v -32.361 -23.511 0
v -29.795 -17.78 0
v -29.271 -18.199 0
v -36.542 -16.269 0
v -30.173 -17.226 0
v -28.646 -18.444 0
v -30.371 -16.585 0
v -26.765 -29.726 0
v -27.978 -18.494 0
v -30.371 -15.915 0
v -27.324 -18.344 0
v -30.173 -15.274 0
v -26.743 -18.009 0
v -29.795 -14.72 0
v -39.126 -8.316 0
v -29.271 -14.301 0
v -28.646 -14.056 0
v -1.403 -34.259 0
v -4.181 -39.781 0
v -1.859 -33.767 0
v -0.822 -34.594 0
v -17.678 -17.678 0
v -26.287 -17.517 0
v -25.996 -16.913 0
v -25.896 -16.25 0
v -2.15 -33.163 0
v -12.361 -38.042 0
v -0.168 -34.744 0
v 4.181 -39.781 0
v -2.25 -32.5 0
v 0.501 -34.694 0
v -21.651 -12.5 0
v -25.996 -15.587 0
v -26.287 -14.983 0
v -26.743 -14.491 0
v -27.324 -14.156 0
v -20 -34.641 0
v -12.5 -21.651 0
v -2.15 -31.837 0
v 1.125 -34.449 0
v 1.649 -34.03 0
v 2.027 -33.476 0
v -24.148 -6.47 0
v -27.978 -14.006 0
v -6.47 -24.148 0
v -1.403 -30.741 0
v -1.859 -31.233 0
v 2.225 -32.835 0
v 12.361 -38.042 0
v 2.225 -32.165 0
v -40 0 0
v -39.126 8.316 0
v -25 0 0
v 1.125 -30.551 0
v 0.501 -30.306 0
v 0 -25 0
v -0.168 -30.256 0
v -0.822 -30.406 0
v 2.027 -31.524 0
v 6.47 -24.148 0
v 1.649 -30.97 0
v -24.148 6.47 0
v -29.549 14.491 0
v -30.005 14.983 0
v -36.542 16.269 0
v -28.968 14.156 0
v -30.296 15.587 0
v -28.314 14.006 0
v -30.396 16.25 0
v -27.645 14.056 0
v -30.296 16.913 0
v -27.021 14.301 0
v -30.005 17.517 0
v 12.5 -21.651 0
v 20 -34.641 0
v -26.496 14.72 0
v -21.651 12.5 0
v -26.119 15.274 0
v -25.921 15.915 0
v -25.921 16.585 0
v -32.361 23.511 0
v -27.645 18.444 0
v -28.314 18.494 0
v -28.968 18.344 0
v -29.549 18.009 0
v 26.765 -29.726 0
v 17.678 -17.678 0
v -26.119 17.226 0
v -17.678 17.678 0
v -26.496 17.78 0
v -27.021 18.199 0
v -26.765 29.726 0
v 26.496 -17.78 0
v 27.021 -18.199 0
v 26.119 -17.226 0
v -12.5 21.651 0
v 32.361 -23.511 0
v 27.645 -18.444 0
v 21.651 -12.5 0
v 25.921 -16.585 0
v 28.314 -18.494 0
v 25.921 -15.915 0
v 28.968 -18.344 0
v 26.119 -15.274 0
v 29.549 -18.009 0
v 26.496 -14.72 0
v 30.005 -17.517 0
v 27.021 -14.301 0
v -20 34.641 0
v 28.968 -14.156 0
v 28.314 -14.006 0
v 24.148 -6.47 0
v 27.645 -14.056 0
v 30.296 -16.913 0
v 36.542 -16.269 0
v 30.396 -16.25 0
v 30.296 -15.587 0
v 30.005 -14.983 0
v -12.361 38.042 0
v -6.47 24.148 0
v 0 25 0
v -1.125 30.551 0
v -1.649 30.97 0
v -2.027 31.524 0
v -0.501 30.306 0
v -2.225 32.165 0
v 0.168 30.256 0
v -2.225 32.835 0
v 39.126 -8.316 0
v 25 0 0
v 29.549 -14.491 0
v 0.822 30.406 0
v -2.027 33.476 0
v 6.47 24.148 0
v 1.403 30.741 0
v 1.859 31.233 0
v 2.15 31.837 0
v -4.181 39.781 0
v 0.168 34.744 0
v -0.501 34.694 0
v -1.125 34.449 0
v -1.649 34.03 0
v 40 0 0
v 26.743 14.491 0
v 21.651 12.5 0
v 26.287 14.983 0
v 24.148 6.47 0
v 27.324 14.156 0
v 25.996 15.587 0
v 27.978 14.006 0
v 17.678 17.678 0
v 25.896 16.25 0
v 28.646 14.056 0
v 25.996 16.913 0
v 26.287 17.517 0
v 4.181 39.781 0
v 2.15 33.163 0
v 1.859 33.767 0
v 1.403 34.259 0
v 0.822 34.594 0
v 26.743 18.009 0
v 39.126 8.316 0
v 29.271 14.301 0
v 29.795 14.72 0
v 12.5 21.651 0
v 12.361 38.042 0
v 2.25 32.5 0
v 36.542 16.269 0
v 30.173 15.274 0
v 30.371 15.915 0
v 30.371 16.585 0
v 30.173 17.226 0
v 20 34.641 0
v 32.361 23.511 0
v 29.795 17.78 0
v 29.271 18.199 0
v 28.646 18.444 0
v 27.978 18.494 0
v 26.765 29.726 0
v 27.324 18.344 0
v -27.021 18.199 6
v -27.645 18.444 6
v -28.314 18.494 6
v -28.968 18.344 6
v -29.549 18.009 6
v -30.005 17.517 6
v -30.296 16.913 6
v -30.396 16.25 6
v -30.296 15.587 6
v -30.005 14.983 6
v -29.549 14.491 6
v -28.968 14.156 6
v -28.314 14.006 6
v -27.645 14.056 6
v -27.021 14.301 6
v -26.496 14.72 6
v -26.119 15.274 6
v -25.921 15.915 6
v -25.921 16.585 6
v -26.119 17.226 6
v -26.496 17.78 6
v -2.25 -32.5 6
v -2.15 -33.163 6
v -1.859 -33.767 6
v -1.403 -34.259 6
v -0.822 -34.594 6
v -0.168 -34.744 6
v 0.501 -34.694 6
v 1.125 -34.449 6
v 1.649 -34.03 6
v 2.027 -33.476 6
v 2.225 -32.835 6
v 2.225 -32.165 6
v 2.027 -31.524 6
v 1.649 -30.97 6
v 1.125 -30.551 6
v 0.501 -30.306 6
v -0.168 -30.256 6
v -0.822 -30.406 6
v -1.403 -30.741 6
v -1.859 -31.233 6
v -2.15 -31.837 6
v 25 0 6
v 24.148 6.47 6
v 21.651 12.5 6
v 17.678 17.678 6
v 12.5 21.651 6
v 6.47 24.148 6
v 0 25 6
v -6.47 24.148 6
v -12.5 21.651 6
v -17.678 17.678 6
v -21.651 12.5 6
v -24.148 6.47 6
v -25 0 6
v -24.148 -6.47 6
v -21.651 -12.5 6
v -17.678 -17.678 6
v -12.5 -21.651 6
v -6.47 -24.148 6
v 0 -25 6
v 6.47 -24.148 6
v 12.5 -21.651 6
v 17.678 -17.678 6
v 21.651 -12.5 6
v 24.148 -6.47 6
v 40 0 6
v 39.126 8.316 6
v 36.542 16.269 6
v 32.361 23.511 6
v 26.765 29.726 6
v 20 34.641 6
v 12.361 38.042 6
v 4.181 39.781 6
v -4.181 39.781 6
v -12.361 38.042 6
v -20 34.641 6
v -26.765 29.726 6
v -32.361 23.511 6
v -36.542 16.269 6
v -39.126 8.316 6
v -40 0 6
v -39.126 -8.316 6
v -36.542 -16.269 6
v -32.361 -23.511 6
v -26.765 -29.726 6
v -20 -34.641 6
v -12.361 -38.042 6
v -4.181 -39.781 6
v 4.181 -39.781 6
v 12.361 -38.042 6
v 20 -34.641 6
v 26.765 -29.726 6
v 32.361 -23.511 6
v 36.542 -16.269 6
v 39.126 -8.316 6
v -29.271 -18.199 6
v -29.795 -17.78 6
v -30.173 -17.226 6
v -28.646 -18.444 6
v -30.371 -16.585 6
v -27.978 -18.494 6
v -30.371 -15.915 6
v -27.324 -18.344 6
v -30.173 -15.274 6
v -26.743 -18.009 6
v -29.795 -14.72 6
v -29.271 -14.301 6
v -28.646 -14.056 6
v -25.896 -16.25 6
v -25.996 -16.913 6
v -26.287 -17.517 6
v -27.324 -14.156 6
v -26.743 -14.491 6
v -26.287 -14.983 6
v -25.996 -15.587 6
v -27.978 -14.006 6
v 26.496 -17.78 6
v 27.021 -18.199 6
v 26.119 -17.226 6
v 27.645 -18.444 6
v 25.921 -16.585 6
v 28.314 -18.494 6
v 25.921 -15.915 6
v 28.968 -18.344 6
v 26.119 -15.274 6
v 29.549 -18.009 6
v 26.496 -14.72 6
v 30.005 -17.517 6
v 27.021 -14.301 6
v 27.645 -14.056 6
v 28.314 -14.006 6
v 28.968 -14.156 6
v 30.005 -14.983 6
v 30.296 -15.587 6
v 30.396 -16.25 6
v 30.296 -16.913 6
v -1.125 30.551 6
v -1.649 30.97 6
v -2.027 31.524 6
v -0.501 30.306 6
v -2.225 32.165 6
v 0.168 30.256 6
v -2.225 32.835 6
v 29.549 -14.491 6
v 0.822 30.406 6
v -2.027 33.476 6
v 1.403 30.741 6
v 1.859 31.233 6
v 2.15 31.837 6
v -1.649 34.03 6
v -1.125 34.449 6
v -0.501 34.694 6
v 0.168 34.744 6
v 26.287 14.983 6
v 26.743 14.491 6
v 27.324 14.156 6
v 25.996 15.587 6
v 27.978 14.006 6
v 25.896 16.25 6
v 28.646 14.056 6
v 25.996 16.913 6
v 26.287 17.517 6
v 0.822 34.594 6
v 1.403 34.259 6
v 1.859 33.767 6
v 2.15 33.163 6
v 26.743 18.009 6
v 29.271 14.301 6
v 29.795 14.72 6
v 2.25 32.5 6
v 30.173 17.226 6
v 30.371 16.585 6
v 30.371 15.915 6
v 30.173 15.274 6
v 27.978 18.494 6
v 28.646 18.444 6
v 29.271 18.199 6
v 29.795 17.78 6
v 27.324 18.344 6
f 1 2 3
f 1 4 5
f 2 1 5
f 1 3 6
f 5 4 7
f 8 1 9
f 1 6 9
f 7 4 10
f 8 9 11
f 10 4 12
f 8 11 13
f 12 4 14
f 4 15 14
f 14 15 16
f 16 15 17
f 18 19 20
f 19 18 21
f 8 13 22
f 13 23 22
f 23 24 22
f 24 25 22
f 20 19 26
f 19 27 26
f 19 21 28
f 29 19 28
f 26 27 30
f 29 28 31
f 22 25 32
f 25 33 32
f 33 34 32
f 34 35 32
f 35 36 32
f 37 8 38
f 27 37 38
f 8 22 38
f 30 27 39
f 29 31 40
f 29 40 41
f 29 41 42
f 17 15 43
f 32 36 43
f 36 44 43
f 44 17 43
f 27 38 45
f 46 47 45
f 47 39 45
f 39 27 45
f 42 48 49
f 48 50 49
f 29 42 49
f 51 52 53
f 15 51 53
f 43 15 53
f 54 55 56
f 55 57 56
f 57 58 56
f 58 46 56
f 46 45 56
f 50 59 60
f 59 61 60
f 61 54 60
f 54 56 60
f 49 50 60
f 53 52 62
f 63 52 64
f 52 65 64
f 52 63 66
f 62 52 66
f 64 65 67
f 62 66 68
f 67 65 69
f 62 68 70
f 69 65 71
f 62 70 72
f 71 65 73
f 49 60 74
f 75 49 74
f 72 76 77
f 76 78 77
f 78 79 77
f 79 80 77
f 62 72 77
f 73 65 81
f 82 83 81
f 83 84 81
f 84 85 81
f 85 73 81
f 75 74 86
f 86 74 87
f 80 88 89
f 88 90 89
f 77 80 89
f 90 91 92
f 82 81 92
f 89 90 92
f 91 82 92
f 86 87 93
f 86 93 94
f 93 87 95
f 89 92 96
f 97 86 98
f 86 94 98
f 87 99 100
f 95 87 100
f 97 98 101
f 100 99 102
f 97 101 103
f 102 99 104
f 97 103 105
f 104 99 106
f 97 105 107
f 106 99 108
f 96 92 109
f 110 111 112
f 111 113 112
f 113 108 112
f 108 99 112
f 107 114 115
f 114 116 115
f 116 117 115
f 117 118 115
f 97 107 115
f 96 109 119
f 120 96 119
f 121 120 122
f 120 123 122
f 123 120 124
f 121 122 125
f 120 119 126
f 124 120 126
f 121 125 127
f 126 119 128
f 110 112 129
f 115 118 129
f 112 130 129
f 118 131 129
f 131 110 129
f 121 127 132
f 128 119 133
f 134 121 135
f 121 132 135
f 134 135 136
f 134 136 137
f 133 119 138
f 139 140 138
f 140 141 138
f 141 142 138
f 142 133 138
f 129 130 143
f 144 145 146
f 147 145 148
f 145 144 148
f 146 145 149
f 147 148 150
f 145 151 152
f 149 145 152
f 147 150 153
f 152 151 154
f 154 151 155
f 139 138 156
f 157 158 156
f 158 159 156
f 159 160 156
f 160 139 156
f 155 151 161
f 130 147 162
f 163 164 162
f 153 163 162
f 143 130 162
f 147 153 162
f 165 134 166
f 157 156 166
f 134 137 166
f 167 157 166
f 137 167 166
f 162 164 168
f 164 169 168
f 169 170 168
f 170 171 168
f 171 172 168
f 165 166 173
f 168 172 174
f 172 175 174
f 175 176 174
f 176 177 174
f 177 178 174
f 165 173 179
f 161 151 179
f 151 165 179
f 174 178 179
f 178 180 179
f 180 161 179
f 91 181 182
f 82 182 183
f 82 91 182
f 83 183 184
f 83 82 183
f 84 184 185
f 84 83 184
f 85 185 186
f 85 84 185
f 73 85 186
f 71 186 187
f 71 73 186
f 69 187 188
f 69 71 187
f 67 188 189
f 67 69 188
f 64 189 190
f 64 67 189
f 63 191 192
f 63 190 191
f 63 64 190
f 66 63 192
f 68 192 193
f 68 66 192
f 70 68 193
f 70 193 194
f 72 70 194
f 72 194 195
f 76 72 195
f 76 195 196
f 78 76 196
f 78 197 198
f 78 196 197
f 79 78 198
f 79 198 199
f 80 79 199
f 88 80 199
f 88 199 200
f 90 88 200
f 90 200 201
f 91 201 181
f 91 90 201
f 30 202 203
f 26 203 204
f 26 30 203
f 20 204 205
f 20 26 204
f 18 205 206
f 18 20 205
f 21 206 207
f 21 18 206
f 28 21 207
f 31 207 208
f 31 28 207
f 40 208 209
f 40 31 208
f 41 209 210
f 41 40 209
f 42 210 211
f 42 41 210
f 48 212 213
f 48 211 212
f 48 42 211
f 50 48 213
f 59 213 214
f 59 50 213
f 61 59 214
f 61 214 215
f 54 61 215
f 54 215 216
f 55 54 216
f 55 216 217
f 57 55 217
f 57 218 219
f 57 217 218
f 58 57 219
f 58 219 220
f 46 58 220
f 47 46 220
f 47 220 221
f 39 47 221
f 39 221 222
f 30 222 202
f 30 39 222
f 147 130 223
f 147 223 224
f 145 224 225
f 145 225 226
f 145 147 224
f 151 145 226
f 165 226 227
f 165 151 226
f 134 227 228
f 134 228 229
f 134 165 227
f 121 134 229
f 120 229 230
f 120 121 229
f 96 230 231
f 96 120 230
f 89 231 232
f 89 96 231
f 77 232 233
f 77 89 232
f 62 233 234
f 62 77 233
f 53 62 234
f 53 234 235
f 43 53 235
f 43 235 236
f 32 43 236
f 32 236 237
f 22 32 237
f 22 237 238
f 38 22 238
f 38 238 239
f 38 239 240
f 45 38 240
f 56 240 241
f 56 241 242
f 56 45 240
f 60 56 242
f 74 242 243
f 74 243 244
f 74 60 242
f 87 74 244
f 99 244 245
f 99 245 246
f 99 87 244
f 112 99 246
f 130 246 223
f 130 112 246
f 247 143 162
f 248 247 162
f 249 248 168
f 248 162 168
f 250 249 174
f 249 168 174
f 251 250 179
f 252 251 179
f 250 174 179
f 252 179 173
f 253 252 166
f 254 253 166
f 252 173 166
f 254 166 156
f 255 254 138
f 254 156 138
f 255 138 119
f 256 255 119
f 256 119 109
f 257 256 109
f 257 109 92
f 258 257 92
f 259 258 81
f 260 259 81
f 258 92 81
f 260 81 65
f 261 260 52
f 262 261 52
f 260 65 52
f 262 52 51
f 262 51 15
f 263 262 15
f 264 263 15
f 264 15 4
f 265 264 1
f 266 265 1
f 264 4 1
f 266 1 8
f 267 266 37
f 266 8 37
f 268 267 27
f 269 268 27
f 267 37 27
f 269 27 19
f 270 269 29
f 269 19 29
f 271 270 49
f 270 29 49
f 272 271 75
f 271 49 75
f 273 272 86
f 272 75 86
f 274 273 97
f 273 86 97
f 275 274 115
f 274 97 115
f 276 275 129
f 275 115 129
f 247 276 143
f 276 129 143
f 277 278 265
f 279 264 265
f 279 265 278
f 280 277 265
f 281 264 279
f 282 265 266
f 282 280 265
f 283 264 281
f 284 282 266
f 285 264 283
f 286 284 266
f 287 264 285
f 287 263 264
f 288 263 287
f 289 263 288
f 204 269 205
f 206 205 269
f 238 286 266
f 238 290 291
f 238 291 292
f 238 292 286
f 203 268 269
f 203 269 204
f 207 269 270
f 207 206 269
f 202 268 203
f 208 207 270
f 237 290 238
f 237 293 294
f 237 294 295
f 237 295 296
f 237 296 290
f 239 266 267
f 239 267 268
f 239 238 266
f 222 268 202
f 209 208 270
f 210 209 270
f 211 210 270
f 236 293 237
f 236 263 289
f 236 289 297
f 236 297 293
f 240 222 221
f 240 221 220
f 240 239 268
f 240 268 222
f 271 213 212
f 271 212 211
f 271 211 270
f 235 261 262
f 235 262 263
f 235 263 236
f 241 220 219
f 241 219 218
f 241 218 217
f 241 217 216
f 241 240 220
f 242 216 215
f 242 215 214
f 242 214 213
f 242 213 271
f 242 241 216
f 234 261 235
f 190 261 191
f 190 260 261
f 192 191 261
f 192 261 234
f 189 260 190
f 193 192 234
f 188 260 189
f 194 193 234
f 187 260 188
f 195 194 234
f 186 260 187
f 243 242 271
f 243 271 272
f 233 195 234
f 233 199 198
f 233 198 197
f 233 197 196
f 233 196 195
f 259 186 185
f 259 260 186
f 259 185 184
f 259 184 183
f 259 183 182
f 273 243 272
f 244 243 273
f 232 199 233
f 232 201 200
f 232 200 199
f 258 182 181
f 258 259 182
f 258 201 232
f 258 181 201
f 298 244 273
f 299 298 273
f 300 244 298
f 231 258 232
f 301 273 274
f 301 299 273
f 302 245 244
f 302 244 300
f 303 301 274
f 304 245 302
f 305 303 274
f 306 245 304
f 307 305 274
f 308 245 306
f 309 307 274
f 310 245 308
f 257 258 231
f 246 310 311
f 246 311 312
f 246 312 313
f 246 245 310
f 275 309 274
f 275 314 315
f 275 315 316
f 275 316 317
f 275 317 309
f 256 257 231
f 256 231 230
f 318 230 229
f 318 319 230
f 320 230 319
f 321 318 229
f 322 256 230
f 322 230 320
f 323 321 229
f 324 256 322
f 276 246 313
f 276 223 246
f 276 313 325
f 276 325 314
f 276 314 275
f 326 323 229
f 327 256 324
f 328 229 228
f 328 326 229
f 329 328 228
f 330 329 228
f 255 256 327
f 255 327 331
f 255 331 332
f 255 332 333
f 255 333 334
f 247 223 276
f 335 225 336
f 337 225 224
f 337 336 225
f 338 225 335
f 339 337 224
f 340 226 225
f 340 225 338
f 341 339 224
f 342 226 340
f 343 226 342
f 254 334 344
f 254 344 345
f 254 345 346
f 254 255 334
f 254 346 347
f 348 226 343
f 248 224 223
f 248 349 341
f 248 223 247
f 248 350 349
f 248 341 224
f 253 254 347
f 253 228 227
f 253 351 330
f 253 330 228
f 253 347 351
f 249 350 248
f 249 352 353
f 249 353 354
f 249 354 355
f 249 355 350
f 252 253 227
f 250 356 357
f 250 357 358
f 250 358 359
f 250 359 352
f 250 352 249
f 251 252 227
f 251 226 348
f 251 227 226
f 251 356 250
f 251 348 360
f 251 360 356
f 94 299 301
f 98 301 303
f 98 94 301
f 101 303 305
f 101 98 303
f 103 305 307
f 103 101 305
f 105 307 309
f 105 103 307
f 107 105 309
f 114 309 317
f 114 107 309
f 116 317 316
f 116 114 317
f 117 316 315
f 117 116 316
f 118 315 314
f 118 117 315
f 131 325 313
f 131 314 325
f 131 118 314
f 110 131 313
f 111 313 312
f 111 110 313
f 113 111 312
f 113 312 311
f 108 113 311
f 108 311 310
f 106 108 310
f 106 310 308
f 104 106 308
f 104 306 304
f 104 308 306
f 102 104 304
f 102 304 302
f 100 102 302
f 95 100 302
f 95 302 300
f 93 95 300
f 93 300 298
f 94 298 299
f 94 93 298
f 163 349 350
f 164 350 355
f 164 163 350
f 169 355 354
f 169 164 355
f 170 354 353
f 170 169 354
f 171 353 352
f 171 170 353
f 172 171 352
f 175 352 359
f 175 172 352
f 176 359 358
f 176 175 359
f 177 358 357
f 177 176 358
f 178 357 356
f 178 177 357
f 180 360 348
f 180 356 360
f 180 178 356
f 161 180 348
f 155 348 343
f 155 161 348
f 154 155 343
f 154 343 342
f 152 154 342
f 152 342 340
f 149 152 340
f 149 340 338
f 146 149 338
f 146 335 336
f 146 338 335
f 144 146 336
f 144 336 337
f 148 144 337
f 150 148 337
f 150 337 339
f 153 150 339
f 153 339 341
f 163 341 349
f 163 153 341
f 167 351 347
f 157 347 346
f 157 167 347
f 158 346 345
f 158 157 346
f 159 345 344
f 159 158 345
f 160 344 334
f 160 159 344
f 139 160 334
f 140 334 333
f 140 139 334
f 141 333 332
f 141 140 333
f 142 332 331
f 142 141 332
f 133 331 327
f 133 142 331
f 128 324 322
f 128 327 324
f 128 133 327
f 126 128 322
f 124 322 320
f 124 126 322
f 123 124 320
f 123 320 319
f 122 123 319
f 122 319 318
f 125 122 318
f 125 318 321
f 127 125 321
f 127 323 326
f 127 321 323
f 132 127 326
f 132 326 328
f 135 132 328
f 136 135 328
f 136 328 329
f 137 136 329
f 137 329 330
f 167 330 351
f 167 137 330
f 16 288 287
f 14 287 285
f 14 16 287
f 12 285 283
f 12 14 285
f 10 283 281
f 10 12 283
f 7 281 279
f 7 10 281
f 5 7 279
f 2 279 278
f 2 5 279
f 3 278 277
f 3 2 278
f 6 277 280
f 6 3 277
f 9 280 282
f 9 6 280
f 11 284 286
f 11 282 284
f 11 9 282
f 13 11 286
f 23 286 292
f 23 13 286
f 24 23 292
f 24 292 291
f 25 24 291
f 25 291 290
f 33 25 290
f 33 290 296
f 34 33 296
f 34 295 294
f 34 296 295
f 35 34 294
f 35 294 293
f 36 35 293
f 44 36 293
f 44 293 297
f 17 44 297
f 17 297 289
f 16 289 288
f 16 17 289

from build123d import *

# Parameters (mm, degrees)
SKETCH1_R           = 40
SKETCH1_R_2         = 25
BOSS_EXTRUDE1_DEPTH = 6
SKETCH2_R           = 2.25
CUT_EXTRUDE1_DEPTH  = 57.885850613
CIRPATTERN1_COUNT   = 6


with BuildPart() as part:
    # Sketch1 → Boss-Extrude1 (new body)
    with BuildSketch(Plane.XY):
        Circle(SKETCH1_R)
        Circle(SKETCH1_R_2, mode=Mode.SUBTRACT)
    extrude(amount=BOSS_EXTRUDE1_DEPTH)

    # Sketch2 → Cut-Extrude1 (cut, through all)
    with BuildSketch(Plane.XY):
        with Locations((0, 32.5)):
            Circle(SKETCH2_R)
    cut_extrude1 = extrude(amount=CUT_EXTRUDE1_DEPTH, mode=Mode.SUBTRACT)

    # CirPattern1: Cut-Extrude1 ×6 about axis
    cirpattern1_axis = Axis((0, 0, 6), (0, 0, 1))
    for i in range(1, CIRPATTERN1_COUNT):
        add(cut_extrude1.rotate(cirpattern1_axis, i * 360 / CIRPATTERN1_COUNT), mode=Mode.SUBTRACT)


solid = part.part
